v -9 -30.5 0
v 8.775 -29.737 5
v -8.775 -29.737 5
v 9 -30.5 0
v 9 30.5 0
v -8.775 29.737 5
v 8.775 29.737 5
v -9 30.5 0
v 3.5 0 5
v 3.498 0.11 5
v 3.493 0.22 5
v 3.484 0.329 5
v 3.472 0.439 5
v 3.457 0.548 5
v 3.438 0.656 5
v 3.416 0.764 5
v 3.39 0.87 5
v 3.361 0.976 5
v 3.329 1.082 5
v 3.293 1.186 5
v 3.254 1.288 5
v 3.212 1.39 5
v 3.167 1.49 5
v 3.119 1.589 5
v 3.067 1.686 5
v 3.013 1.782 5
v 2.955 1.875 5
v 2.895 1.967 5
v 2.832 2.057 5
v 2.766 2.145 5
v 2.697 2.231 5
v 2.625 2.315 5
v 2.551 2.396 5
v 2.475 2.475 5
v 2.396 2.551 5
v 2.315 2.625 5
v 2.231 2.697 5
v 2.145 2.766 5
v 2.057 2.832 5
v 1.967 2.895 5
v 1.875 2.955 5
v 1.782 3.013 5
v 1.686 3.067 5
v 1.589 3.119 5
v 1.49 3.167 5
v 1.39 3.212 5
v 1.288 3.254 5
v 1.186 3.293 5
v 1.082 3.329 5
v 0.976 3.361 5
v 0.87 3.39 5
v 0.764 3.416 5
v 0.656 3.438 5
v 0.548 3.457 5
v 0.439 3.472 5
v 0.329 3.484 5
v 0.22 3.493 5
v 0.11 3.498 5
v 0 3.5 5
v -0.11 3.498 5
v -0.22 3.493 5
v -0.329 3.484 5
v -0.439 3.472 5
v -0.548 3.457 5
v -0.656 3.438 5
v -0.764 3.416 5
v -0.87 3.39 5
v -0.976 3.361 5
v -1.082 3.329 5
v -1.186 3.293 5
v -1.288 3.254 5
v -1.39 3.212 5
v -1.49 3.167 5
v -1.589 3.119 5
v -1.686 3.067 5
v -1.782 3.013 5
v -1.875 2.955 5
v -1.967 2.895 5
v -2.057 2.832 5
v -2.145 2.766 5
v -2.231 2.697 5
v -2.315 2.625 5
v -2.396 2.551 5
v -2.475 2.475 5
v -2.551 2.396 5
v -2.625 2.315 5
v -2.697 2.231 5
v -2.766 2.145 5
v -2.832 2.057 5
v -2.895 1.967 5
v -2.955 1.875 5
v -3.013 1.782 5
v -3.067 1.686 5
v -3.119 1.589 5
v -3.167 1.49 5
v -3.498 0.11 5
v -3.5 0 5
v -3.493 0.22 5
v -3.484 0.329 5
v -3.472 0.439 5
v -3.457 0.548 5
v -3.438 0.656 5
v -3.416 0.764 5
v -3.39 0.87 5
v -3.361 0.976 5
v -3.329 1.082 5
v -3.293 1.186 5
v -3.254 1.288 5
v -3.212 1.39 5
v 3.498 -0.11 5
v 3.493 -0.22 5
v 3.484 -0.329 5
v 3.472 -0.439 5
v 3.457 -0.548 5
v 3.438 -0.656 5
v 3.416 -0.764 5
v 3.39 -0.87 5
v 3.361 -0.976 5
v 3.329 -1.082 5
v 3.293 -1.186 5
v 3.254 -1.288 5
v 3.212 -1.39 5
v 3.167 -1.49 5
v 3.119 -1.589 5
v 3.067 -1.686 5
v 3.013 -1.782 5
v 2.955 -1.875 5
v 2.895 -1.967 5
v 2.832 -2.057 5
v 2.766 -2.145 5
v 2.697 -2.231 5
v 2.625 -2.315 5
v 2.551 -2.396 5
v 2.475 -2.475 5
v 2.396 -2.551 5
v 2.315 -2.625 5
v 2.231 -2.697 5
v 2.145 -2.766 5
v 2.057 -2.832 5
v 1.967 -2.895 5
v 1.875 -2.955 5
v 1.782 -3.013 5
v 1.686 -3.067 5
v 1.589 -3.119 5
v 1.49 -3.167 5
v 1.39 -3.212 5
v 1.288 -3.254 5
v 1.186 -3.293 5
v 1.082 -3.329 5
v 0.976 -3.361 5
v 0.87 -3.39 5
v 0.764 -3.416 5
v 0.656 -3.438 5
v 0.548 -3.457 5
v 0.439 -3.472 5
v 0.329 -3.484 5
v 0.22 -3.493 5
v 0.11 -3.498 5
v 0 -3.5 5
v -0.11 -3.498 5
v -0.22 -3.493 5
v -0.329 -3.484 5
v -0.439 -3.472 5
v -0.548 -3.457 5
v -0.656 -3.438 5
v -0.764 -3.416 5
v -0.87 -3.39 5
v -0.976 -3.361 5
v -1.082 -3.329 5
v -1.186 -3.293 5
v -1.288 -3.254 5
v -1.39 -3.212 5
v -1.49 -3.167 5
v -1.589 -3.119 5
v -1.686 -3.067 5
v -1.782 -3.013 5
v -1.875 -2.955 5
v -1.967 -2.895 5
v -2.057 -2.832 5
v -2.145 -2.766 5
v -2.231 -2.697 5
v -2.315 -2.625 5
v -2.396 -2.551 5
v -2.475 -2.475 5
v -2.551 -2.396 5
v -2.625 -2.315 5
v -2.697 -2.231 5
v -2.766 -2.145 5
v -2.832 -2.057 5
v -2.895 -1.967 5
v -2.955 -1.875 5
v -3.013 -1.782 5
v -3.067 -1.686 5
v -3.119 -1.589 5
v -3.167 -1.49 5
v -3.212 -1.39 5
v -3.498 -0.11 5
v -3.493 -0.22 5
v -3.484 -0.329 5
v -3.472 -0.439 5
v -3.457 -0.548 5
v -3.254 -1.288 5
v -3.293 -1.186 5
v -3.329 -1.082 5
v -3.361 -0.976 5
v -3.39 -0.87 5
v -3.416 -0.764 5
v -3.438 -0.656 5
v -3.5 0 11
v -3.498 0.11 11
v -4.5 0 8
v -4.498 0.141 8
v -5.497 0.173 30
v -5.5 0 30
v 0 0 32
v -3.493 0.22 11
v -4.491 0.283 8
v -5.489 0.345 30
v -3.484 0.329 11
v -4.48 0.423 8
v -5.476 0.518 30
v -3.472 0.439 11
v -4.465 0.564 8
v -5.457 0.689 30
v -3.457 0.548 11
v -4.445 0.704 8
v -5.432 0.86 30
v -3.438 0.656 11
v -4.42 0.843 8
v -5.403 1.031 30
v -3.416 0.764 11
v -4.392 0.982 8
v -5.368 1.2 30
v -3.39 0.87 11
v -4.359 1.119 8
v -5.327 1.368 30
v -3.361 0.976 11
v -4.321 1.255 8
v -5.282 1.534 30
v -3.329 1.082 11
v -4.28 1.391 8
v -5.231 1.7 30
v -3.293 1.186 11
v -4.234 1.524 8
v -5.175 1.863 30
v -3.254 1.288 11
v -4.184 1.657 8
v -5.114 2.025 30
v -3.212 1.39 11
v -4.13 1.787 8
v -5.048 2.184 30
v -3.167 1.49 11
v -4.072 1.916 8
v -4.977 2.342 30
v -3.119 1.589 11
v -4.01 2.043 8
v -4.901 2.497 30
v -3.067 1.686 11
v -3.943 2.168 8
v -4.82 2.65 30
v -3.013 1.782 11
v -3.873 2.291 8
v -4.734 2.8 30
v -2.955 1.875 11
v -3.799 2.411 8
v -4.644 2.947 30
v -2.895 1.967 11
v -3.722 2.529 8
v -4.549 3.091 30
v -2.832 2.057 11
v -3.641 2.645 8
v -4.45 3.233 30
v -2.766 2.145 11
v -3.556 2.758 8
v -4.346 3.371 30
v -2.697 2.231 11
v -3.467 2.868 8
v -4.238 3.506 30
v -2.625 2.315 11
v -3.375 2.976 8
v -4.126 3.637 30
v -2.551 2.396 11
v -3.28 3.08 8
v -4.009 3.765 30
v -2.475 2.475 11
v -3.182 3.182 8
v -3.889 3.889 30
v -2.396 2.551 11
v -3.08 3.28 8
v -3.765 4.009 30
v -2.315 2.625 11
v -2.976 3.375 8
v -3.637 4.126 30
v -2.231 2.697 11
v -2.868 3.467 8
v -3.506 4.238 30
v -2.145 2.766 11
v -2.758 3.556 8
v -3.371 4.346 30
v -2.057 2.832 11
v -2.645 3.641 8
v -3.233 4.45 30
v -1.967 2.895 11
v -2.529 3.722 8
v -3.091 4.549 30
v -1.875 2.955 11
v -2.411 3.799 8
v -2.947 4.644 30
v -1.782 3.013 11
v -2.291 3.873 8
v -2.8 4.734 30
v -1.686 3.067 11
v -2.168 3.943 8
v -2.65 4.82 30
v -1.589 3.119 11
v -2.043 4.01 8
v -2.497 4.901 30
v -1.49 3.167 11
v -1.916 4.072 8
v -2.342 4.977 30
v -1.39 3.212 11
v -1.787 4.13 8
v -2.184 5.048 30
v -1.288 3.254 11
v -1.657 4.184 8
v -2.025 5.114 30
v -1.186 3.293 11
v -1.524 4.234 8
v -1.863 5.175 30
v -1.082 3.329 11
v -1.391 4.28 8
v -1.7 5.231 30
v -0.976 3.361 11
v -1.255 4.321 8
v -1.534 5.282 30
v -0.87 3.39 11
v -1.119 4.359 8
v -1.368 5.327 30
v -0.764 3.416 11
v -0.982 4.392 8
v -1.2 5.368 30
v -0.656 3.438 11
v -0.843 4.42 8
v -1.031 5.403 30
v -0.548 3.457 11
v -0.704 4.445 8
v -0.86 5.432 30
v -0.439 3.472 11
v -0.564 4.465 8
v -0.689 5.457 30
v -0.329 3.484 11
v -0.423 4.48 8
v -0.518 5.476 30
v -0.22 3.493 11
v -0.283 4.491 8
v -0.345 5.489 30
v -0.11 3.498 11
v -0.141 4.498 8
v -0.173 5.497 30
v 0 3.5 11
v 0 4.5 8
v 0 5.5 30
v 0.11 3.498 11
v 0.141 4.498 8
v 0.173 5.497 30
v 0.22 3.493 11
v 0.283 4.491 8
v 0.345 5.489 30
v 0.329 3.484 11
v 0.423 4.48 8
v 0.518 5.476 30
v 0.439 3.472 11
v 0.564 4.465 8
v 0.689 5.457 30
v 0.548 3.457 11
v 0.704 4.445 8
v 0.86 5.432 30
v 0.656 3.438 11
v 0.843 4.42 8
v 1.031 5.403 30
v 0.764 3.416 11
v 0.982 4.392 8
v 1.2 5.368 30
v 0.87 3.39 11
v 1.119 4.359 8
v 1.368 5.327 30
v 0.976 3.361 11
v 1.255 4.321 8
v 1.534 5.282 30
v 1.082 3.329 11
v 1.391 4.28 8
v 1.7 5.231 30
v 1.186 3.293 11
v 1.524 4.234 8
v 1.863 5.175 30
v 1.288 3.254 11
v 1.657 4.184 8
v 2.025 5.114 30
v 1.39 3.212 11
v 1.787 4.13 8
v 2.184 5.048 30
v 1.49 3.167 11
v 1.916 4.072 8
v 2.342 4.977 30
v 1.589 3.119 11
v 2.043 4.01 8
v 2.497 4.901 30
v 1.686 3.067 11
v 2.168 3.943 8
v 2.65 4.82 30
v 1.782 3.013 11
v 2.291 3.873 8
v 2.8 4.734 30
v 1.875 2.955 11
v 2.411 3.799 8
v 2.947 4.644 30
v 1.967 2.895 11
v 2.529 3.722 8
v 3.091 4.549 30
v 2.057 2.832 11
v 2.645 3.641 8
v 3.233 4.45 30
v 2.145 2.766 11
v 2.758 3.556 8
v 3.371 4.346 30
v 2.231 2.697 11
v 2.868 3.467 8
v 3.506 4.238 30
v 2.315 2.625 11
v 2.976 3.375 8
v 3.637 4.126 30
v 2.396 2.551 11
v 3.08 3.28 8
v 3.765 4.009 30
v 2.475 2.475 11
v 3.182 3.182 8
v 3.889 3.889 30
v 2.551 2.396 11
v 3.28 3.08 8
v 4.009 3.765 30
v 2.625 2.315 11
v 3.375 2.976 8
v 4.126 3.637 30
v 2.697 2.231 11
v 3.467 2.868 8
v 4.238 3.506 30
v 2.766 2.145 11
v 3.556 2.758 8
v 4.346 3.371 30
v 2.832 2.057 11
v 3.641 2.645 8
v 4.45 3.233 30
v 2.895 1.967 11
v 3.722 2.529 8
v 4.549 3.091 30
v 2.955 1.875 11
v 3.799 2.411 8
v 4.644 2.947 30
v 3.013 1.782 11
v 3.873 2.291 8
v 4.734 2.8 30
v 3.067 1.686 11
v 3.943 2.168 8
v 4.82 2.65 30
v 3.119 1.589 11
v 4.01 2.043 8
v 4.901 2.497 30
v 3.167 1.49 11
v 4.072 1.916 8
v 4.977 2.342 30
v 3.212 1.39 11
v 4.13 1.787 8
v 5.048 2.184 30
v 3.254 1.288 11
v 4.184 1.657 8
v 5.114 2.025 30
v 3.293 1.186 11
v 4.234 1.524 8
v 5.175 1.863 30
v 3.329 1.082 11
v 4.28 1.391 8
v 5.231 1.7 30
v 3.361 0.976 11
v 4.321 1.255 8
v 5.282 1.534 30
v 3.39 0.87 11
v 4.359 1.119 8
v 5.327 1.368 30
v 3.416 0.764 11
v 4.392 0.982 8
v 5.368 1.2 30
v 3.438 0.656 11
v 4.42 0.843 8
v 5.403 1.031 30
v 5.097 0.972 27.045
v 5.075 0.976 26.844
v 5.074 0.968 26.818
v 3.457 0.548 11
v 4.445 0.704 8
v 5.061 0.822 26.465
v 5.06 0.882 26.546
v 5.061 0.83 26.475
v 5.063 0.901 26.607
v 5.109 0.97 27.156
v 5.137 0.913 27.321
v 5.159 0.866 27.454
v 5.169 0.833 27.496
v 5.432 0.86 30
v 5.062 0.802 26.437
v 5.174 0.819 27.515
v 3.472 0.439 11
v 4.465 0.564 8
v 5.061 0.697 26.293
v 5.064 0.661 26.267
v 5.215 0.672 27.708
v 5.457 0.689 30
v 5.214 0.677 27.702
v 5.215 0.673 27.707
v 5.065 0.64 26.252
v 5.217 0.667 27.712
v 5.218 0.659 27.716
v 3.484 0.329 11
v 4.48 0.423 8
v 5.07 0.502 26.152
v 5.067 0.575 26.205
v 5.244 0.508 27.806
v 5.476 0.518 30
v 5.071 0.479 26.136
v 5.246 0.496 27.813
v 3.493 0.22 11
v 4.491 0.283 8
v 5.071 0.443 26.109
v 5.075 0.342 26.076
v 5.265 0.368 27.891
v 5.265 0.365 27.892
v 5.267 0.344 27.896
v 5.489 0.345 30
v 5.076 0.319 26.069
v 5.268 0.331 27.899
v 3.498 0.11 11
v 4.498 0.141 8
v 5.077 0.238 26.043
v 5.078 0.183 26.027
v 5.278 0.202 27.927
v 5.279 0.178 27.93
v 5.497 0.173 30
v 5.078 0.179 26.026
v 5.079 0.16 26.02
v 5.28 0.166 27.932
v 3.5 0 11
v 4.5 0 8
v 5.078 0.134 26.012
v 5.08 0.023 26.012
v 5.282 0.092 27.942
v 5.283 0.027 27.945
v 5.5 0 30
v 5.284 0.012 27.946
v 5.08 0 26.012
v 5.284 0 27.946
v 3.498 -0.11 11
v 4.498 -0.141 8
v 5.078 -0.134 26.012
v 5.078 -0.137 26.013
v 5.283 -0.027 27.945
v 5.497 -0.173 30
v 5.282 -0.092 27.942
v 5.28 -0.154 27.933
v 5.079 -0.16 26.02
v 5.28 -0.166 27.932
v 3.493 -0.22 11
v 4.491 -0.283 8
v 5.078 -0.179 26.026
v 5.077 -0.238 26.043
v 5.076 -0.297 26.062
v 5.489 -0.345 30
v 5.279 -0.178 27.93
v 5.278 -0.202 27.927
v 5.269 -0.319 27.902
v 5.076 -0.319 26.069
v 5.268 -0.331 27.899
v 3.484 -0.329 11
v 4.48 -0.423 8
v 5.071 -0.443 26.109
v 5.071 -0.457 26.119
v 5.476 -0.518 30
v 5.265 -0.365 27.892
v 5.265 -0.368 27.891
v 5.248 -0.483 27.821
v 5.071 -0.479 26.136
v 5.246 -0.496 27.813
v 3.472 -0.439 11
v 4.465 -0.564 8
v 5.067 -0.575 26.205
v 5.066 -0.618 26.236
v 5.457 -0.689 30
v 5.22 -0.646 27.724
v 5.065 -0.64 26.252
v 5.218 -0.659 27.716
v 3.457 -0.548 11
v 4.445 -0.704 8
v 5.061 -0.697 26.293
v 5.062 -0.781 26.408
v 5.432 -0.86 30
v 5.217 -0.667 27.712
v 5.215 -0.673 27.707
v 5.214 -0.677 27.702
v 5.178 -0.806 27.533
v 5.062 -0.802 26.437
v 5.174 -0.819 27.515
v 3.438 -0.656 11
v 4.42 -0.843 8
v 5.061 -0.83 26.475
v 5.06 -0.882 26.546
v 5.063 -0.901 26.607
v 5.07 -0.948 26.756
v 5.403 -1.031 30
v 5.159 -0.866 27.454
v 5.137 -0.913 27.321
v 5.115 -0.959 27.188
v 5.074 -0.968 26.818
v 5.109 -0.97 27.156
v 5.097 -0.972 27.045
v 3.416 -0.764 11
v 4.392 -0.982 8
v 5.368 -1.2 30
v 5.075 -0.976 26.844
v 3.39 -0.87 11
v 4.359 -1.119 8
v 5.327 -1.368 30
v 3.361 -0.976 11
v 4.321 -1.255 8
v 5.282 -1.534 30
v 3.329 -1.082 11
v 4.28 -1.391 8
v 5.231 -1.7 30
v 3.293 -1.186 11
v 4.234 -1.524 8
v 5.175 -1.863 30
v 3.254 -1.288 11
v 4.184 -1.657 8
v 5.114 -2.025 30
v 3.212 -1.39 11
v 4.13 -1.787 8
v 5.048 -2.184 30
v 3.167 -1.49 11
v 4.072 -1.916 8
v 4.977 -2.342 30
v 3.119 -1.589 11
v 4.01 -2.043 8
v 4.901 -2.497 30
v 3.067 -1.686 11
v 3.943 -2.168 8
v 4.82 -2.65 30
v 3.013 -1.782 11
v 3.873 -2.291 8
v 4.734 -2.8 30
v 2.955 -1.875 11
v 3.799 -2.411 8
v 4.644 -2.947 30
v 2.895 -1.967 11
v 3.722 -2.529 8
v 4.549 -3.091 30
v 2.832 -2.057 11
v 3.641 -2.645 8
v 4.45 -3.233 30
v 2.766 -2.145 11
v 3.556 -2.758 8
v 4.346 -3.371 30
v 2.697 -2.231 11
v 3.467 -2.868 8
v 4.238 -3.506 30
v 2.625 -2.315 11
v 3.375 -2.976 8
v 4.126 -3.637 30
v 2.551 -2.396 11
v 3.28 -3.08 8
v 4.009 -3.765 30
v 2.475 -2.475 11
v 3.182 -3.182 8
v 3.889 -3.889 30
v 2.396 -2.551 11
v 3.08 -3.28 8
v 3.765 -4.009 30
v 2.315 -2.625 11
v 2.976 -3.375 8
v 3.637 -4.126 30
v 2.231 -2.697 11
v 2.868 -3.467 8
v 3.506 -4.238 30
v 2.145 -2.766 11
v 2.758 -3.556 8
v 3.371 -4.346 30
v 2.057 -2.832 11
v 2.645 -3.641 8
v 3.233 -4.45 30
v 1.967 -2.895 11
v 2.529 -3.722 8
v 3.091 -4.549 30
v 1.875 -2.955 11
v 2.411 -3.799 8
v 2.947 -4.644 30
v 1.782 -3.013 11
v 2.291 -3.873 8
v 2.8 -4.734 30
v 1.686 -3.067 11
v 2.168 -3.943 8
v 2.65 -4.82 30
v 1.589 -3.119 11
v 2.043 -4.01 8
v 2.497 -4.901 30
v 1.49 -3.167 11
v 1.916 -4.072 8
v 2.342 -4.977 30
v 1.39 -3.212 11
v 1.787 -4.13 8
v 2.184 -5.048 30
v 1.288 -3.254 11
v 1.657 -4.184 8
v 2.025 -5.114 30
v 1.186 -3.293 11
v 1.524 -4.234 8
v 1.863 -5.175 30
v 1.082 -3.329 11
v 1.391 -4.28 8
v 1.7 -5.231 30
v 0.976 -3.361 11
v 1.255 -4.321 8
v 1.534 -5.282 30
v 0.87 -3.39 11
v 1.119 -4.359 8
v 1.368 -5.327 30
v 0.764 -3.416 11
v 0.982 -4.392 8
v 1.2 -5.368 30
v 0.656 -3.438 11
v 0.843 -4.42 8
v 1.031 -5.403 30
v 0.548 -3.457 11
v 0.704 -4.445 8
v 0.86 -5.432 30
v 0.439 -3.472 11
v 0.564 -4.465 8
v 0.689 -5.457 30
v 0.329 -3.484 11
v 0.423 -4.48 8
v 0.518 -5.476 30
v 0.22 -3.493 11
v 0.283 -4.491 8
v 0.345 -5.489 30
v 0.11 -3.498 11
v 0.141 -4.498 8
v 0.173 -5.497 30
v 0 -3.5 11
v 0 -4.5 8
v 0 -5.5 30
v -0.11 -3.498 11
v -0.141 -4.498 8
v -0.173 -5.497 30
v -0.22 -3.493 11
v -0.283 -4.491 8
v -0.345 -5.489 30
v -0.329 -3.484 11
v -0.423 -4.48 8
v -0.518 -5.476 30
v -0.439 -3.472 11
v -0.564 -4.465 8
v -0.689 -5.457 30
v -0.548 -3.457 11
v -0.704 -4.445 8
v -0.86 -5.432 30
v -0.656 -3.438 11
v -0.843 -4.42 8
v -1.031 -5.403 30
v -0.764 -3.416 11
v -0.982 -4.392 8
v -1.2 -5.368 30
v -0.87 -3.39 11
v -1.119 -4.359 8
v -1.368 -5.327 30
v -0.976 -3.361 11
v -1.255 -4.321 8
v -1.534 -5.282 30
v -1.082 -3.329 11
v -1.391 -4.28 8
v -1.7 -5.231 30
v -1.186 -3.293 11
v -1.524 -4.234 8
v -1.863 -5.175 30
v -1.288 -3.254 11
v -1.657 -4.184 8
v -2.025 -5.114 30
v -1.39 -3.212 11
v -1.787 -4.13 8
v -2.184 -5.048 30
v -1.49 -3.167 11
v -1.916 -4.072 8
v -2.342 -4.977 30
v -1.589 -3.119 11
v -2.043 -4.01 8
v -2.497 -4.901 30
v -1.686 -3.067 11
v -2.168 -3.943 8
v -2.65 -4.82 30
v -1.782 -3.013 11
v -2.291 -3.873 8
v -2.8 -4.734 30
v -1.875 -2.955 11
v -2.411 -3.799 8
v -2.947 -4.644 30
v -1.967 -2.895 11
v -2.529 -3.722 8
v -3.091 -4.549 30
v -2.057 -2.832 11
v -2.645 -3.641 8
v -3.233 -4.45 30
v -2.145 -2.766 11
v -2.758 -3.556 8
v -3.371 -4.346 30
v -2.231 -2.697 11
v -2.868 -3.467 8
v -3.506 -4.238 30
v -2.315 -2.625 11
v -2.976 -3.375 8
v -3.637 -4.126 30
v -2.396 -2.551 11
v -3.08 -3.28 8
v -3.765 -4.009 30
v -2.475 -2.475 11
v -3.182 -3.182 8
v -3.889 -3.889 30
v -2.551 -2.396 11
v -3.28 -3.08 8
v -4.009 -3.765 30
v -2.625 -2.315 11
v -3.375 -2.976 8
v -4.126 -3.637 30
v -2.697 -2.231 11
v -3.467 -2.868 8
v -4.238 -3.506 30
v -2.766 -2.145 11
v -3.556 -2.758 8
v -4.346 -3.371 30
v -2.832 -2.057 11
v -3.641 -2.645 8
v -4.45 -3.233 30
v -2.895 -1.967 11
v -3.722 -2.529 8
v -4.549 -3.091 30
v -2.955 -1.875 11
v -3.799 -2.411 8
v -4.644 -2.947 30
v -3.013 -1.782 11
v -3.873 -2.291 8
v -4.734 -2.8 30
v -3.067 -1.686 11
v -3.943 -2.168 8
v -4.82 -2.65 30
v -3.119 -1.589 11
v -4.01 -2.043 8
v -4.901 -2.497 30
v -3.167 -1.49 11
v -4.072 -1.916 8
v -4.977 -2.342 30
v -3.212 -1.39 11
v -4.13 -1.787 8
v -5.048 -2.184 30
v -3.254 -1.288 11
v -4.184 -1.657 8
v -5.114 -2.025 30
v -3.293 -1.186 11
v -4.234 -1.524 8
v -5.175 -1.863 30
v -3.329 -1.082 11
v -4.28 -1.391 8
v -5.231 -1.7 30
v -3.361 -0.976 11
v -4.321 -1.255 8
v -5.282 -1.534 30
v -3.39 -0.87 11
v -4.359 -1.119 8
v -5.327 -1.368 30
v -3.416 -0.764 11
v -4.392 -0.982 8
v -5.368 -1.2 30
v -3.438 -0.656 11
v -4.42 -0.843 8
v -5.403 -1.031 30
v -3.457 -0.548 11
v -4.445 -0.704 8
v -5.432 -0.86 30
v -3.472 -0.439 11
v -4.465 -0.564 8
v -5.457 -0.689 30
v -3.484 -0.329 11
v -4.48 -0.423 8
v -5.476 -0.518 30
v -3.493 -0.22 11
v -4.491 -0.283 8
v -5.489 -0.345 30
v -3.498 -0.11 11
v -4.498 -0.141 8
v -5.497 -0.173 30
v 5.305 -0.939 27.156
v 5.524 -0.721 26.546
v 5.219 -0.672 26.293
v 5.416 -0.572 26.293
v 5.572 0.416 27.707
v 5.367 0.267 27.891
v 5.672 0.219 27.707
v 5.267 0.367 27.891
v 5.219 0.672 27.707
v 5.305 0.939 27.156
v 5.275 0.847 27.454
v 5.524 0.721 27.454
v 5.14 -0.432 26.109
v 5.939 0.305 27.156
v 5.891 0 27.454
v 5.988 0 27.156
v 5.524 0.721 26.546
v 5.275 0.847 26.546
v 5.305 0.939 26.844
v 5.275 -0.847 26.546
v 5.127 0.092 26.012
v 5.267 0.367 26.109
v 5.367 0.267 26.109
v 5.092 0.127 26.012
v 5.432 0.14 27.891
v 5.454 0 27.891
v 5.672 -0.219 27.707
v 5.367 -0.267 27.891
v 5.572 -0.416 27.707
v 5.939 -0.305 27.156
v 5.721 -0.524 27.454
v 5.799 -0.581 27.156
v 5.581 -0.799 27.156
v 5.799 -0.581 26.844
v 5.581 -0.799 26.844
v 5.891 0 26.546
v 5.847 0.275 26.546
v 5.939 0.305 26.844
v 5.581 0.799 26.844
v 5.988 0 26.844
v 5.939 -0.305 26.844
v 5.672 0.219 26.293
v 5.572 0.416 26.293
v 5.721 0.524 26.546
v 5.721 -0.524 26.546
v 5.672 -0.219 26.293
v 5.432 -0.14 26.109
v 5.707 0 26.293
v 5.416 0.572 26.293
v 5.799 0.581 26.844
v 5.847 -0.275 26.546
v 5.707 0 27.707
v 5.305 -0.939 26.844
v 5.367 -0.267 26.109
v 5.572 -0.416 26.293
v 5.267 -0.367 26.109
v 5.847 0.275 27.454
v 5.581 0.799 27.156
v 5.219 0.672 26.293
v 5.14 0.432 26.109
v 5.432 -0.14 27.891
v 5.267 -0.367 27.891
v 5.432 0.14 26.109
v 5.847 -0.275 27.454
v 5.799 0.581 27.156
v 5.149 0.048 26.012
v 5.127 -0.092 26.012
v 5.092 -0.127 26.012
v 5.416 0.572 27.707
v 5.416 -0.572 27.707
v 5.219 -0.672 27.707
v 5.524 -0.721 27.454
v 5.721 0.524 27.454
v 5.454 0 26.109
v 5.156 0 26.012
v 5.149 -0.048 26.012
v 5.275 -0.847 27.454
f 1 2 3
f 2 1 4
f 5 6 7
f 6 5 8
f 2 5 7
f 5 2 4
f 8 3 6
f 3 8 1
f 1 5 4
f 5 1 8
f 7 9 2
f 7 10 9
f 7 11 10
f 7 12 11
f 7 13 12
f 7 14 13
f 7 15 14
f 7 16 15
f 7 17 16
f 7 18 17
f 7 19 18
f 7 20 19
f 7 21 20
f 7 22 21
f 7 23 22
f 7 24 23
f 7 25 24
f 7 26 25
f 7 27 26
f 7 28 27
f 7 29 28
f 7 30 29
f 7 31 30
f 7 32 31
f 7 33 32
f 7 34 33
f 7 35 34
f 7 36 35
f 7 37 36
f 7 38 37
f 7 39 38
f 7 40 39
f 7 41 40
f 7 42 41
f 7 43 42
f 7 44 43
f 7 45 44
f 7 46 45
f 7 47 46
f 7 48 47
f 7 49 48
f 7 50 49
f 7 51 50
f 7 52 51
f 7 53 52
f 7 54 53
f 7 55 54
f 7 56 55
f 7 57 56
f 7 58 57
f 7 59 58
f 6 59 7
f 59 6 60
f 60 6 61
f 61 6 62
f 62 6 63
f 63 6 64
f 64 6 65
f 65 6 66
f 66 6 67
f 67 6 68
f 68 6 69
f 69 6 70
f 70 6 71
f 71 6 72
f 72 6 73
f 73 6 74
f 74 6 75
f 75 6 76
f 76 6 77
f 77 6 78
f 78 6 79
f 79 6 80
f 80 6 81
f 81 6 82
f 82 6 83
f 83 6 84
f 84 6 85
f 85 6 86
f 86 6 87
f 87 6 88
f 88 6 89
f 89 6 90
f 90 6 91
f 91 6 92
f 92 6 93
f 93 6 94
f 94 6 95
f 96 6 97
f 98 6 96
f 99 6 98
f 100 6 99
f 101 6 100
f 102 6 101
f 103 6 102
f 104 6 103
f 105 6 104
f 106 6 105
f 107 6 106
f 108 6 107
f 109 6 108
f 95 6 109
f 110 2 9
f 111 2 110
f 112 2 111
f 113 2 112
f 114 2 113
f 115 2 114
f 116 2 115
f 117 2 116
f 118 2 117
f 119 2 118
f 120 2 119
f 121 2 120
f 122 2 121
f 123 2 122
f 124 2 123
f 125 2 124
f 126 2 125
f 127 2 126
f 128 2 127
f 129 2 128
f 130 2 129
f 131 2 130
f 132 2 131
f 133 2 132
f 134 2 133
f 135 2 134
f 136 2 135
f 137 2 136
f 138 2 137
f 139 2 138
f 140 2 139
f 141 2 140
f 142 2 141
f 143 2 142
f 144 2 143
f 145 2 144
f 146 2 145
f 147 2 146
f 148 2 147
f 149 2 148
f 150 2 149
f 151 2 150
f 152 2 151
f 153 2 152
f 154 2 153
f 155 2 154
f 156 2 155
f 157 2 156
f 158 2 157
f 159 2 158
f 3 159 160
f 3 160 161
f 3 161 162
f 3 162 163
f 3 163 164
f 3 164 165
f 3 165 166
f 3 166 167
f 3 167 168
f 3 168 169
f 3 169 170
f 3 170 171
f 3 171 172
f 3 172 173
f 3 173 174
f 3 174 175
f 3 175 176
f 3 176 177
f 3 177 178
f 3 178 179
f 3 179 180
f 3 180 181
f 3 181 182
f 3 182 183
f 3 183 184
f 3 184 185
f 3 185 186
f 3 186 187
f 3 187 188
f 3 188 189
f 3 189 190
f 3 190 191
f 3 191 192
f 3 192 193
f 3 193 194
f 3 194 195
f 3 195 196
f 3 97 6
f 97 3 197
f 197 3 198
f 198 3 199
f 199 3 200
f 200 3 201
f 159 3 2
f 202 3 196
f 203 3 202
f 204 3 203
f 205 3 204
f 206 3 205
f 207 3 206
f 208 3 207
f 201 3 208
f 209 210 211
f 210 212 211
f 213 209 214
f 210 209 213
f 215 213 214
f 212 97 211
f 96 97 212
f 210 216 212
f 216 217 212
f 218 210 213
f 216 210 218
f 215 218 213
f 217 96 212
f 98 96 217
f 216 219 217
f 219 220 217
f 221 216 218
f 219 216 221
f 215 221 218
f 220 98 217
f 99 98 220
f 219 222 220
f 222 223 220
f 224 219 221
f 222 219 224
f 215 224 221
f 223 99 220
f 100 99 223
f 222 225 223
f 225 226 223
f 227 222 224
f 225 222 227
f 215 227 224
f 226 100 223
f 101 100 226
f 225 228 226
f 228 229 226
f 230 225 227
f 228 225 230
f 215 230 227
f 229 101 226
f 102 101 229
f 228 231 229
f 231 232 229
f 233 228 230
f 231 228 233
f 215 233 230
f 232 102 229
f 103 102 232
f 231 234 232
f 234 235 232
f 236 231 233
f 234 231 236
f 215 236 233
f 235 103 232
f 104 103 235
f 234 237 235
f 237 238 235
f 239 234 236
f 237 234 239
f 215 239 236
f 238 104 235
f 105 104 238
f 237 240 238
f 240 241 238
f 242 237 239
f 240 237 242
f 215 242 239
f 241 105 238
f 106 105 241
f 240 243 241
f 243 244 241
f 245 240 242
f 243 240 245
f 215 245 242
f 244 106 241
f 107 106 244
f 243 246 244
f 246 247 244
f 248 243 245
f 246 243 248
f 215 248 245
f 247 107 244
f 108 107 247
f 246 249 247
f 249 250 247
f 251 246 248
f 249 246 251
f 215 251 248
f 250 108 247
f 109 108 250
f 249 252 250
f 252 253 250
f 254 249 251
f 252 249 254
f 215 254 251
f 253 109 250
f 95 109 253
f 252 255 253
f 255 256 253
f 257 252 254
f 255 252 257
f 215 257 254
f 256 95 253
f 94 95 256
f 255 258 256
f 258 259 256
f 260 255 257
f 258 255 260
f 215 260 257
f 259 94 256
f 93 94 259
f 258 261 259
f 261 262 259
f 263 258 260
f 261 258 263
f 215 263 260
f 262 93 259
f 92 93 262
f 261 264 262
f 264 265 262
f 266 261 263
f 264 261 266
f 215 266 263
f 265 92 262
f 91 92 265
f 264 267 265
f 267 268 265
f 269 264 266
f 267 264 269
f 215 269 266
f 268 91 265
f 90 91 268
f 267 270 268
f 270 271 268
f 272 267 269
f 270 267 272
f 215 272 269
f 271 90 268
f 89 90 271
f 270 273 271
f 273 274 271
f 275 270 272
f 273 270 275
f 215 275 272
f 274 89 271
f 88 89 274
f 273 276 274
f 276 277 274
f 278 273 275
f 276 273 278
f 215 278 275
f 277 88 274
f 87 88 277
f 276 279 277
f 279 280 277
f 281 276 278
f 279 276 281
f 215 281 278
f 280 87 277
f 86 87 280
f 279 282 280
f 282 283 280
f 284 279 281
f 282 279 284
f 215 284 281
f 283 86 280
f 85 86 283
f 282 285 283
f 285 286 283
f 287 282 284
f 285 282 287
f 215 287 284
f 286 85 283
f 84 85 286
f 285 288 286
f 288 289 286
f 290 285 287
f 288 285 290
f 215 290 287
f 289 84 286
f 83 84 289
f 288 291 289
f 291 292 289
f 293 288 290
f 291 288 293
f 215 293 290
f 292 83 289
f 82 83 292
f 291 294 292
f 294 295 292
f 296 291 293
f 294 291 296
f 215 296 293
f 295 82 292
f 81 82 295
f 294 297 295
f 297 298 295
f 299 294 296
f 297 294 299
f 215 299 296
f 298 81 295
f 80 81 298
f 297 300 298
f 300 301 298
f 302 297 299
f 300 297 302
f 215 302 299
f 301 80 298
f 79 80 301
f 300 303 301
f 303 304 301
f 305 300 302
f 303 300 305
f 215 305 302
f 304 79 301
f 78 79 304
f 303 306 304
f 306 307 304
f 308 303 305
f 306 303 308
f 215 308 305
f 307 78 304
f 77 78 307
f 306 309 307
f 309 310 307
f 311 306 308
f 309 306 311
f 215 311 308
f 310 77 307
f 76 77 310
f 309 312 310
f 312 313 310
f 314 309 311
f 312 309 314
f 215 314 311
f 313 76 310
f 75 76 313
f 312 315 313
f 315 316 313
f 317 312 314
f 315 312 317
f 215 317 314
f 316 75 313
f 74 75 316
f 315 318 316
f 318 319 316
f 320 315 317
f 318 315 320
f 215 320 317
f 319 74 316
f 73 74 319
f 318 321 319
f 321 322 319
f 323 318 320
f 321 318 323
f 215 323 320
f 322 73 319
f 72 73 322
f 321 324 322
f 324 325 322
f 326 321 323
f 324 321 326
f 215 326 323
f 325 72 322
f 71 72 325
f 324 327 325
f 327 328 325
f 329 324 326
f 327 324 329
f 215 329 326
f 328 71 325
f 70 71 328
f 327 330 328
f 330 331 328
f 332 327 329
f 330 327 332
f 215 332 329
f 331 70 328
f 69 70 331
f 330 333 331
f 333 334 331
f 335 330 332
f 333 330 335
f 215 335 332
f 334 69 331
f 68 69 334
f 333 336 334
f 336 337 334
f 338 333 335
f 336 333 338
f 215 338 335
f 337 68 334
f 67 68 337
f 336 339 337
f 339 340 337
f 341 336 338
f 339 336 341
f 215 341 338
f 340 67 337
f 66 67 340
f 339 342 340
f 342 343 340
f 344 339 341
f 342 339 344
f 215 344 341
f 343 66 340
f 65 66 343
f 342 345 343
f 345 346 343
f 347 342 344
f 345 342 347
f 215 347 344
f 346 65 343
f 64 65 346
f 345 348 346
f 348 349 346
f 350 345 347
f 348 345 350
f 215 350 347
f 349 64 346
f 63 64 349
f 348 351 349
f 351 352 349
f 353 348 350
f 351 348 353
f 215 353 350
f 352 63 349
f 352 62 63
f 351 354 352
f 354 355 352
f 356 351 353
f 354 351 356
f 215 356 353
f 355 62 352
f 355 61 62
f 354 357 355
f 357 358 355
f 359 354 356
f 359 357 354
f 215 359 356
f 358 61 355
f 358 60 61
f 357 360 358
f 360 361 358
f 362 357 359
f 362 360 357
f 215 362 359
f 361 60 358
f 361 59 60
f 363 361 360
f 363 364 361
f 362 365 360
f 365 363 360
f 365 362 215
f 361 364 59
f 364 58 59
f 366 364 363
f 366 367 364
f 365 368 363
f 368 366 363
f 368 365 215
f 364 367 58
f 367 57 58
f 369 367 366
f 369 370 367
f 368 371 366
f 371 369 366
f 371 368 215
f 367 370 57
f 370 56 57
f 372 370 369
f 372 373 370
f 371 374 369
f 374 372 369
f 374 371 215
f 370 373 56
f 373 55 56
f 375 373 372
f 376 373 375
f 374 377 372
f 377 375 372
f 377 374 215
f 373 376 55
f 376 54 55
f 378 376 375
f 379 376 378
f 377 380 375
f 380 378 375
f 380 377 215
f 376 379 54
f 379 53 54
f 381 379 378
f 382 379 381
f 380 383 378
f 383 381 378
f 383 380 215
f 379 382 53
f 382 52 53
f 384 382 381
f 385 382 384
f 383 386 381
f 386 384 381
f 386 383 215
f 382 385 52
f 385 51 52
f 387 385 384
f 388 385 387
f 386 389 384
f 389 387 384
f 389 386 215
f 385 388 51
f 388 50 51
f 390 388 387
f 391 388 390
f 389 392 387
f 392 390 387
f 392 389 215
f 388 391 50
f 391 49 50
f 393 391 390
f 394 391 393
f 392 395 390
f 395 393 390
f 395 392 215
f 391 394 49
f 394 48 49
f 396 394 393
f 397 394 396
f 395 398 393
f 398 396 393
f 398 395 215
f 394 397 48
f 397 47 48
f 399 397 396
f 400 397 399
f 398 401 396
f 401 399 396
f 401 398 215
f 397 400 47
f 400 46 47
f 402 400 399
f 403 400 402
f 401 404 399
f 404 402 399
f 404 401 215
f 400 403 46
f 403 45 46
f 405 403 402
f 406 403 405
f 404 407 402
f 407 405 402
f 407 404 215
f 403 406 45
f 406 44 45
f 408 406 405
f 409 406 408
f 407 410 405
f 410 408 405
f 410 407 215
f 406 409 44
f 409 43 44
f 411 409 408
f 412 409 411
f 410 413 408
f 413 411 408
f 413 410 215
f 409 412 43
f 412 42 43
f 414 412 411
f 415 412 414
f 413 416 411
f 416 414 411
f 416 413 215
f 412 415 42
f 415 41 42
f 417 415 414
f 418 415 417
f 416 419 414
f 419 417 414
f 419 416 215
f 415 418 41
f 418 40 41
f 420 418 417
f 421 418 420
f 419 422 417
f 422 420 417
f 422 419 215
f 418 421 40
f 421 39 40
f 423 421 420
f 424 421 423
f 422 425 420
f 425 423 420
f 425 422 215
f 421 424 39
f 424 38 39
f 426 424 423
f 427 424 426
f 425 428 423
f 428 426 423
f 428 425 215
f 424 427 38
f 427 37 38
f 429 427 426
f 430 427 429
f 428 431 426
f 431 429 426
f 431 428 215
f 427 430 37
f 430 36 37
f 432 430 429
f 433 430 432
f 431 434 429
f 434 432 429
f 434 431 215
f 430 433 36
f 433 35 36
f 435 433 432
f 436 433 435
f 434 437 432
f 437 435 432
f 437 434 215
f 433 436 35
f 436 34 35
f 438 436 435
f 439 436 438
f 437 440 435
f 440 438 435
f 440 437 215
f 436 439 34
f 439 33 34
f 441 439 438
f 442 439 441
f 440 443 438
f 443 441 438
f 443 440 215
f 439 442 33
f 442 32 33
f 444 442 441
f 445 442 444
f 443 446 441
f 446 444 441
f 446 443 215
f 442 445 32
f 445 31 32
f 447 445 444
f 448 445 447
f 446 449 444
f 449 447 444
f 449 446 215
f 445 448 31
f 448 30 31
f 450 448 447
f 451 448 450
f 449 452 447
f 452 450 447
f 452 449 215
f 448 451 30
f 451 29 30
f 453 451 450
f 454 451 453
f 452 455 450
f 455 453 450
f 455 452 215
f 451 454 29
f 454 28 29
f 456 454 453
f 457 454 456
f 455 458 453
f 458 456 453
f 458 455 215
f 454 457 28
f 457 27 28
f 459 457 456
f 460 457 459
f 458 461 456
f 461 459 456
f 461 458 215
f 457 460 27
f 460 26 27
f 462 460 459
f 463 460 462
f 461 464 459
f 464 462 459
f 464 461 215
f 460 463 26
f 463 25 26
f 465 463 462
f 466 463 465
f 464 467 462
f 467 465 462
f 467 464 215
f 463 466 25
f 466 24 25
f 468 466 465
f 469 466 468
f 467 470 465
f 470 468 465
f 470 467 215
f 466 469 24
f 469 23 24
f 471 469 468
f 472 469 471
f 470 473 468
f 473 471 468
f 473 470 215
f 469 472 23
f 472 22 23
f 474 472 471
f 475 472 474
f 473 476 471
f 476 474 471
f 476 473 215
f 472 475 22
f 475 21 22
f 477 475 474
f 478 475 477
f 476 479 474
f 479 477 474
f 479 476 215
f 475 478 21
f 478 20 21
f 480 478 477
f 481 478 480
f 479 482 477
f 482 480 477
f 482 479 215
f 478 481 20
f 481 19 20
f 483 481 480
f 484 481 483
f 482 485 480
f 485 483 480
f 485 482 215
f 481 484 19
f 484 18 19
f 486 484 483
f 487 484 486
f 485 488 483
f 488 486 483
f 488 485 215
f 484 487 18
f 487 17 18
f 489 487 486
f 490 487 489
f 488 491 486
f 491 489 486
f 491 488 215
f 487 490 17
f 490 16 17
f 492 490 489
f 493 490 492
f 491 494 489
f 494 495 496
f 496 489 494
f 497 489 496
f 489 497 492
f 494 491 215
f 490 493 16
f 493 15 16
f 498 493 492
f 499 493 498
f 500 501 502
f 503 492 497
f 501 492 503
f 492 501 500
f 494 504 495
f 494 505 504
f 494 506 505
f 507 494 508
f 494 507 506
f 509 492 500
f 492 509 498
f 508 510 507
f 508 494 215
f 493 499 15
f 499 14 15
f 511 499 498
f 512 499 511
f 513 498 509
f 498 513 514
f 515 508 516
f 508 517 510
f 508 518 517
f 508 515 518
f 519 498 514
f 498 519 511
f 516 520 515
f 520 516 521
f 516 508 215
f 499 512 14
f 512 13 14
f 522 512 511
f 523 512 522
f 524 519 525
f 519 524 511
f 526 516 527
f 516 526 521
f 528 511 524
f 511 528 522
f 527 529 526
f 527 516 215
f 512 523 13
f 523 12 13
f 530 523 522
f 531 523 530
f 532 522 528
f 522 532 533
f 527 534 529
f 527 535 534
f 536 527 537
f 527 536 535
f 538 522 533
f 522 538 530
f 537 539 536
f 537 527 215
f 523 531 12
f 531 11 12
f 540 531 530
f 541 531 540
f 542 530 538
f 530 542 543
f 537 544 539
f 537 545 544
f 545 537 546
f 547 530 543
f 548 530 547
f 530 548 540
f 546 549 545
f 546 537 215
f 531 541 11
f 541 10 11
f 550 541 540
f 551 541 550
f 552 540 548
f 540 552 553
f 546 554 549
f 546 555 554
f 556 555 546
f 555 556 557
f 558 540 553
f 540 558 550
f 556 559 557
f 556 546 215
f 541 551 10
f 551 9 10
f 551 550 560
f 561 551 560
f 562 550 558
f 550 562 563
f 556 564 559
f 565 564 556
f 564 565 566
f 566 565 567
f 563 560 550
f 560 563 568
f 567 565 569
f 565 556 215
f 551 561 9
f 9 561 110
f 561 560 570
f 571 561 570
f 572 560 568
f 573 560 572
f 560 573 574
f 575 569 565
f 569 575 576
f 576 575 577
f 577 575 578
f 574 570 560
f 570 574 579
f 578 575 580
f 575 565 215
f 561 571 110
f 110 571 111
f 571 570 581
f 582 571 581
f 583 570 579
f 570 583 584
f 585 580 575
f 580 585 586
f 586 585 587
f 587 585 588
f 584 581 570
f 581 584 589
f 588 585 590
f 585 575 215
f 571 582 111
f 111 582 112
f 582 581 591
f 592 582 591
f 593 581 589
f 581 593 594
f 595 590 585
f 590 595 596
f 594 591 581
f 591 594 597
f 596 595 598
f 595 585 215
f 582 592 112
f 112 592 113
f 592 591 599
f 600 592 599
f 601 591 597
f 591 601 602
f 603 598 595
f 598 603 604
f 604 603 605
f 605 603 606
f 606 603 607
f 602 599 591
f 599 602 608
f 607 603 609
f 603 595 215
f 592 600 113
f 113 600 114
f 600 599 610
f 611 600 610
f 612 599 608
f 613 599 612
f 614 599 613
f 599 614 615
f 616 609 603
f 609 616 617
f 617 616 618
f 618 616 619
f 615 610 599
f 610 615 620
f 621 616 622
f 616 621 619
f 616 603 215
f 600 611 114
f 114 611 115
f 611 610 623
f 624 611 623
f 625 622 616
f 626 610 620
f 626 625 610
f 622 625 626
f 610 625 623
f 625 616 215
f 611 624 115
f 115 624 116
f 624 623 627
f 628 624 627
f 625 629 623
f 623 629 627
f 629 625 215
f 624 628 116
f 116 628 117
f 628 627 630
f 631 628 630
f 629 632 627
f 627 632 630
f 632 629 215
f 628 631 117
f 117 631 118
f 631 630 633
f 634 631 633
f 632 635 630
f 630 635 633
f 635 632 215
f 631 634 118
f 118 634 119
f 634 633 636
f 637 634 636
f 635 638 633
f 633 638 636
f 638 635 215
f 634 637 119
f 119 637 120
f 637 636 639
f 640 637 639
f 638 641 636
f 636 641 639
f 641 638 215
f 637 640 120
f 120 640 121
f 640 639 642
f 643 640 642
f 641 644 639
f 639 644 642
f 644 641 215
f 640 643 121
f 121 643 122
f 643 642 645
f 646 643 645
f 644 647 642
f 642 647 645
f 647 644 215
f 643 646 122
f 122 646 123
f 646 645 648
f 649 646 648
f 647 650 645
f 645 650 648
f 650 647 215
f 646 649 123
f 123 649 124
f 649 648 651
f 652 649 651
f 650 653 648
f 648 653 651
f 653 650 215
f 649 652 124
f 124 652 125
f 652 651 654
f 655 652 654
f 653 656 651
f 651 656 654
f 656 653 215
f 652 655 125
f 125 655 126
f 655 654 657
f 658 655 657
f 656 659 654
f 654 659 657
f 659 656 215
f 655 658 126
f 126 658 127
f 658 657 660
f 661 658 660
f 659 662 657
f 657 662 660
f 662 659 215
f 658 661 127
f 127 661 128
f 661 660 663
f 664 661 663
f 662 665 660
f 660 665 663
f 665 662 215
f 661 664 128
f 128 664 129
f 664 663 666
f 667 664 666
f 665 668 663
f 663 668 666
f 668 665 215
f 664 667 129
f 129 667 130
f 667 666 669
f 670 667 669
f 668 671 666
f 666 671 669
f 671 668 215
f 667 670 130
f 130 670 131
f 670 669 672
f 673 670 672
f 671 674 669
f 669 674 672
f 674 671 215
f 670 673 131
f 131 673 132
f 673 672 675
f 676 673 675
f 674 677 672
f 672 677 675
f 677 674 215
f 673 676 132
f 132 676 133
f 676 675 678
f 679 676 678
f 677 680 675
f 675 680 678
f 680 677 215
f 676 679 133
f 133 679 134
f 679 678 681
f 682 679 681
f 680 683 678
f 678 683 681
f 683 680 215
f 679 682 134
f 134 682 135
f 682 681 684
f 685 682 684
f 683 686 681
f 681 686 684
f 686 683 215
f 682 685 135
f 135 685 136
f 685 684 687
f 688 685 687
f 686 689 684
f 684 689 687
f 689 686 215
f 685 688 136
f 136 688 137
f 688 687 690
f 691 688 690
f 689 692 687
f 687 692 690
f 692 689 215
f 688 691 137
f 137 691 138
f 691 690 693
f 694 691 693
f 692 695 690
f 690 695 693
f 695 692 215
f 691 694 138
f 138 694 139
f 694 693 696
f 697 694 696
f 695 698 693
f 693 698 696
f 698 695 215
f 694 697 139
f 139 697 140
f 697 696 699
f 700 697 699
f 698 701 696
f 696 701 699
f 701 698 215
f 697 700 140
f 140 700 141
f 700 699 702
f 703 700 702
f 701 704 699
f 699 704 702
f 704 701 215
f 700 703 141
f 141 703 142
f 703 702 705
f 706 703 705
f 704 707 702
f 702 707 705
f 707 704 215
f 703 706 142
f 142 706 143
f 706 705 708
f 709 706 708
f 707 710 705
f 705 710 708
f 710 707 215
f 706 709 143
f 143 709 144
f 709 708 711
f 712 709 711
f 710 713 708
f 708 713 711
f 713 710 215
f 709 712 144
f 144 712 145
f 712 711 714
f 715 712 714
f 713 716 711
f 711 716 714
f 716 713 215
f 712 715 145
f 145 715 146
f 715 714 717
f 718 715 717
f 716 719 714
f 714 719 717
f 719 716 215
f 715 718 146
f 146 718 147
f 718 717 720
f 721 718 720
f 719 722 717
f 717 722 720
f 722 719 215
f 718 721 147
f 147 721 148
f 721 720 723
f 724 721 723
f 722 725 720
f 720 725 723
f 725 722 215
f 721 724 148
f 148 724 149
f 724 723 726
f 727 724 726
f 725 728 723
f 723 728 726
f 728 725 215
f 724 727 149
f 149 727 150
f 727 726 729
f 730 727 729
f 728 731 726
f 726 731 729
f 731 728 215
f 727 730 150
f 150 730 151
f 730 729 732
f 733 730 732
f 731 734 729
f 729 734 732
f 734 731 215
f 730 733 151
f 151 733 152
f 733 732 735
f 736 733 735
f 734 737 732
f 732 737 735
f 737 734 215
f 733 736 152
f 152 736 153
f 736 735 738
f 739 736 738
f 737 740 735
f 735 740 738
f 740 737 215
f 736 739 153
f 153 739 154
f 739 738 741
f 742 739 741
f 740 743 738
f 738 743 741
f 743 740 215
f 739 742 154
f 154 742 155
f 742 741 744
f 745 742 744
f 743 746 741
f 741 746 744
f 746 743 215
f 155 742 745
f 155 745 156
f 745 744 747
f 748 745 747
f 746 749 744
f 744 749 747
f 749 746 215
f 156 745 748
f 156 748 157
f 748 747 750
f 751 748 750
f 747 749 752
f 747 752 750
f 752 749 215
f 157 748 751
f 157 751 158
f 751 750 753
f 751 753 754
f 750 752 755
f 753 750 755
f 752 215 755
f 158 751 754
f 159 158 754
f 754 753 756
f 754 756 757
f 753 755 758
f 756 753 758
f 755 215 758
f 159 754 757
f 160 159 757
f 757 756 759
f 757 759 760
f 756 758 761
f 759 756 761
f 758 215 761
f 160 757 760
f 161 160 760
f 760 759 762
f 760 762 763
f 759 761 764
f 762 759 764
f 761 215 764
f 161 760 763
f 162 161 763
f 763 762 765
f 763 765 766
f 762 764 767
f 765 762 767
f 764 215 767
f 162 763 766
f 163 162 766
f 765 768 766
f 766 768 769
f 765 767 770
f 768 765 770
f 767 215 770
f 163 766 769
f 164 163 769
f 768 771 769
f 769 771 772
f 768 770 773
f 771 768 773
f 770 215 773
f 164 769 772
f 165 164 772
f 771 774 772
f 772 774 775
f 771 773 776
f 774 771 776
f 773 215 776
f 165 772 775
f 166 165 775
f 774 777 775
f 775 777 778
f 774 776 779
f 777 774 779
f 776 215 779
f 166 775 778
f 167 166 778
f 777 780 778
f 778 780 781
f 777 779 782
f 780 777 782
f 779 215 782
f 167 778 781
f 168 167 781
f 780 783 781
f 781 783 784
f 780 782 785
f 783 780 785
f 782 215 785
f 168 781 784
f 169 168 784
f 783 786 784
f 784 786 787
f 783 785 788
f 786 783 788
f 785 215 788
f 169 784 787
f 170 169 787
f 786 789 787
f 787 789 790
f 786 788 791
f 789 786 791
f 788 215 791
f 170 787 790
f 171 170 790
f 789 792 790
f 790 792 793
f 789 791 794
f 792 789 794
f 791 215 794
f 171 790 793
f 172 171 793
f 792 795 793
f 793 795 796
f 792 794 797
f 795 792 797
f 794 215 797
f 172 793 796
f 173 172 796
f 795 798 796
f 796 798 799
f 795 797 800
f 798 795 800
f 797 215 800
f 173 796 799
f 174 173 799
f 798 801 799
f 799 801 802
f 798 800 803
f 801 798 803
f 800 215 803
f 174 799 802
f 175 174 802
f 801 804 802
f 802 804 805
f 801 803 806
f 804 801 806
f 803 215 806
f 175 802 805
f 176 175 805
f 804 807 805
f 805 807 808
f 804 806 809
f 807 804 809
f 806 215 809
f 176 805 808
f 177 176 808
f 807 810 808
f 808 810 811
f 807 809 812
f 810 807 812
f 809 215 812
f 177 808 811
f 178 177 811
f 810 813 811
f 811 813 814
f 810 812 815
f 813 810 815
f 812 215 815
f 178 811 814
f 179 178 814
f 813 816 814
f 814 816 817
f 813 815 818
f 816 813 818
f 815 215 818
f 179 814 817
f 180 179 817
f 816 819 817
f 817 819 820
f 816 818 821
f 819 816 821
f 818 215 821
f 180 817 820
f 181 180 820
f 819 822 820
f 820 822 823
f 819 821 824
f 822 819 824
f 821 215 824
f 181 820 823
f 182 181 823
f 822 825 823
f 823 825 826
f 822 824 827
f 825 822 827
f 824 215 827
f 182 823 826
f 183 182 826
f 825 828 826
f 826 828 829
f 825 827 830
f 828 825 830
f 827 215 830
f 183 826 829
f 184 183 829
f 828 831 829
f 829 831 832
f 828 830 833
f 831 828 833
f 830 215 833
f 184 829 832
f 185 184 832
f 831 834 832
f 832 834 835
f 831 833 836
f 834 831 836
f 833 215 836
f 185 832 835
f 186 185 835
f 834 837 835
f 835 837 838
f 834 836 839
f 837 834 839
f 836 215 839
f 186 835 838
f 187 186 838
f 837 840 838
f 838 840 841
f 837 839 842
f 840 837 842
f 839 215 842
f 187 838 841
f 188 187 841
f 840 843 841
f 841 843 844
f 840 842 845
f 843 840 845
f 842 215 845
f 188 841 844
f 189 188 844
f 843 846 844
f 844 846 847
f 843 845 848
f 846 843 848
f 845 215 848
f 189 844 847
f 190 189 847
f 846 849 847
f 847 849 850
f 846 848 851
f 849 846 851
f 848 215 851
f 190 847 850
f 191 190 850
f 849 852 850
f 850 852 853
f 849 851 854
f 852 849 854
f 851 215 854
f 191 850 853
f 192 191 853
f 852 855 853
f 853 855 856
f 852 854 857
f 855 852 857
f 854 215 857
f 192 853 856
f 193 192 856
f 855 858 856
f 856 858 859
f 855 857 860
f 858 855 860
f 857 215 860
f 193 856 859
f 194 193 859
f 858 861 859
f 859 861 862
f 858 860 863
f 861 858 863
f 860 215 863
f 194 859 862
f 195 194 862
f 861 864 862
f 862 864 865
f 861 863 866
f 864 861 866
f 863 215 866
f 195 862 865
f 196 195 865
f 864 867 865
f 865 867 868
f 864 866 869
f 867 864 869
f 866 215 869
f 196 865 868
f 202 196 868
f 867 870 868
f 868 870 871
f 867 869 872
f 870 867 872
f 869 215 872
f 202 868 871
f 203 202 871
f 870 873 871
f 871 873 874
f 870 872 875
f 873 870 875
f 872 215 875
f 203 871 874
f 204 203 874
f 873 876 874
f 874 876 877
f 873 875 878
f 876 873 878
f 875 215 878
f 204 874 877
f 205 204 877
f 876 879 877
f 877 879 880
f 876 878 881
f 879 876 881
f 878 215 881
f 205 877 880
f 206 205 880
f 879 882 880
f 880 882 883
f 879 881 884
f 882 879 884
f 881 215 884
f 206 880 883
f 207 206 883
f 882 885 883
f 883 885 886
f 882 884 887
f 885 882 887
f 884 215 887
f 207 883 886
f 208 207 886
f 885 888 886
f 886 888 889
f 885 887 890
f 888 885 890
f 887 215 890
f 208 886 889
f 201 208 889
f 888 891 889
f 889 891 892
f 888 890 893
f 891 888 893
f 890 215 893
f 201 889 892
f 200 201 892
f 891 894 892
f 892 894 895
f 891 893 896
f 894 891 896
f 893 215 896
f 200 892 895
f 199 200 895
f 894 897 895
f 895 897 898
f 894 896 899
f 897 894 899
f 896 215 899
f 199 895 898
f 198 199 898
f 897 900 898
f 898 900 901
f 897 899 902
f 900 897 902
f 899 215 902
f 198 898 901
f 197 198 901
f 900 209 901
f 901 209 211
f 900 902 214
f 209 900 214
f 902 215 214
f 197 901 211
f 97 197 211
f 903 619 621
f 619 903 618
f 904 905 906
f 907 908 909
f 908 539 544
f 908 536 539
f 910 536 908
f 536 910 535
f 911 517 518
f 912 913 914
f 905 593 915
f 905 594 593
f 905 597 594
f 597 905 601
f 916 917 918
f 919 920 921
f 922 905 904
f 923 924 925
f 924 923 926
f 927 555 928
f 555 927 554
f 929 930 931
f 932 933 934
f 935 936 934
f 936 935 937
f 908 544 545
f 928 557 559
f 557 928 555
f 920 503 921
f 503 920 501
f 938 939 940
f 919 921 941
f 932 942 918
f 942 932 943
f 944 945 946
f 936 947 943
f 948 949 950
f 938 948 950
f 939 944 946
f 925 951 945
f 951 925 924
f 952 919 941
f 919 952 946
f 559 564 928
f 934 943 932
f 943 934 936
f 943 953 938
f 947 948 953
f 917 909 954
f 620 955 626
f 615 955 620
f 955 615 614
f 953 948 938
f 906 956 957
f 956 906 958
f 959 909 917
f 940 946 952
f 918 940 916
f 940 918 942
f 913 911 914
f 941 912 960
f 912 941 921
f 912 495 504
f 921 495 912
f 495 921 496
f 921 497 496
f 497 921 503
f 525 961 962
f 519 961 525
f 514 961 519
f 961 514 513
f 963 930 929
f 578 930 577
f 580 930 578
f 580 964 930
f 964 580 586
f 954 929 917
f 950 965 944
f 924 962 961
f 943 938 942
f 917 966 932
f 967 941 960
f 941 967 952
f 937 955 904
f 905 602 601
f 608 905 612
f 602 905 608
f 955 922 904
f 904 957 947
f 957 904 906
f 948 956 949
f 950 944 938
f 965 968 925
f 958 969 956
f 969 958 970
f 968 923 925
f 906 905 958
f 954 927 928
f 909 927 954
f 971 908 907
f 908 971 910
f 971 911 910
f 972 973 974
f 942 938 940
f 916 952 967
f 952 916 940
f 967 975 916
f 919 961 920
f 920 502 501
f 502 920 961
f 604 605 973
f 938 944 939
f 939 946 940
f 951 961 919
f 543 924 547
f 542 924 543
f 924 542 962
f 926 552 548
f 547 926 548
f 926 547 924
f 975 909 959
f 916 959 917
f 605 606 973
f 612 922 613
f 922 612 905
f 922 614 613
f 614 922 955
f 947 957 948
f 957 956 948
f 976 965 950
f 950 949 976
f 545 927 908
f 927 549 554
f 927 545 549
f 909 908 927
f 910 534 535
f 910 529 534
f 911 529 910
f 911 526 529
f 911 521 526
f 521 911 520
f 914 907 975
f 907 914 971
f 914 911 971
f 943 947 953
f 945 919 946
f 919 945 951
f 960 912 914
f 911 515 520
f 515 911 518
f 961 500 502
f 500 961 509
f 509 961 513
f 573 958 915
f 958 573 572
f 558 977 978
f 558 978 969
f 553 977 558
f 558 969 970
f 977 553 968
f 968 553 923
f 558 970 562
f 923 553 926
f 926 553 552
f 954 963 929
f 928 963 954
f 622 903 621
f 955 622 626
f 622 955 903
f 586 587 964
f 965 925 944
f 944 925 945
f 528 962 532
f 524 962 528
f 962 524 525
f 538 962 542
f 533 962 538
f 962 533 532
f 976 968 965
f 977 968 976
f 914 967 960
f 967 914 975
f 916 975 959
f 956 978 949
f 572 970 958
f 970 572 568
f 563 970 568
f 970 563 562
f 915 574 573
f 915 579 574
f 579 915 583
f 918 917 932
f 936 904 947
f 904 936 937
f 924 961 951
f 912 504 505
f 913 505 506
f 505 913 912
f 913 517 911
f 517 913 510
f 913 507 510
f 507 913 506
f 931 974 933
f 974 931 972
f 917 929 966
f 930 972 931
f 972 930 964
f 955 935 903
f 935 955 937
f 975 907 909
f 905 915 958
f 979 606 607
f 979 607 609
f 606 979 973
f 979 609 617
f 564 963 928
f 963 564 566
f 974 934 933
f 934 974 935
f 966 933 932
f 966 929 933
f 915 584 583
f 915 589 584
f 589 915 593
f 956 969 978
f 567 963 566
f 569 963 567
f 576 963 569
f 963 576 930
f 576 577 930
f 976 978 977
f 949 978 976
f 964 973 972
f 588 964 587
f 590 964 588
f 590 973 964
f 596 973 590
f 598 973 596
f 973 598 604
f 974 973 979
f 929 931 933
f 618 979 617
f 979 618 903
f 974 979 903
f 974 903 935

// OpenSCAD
WIDTH 	= 18; // [0:200]
LENGTH 	= 61; // [0:200]


translate([-WIDTH/2,-LENGTH/2,0]) {
	difference() {
		pyramid(WIDTH,LENGTH,200);
	   translate([0,0,5]) cube([WIDTH,LENGTH,200]);
	}
	
	translate([WIDTH/2,LENGTH/2,5]) {
		rotate_extrude($fn=200) polygon(points=[[0,0],[3.5,0],[4.5,3],[3.5,6],[5.5,25],[0,27]]);
		translate([5,0,22]) sphere(r=1, $fn=20);
	}
}



// By Danny Staple, https://github.com/dannystaple/OpenSCAD-Parts-Library
module pyramid(w, l, h) {
	mw = w/2;
	ml = l/2;
	polyhedron(points = [
		[0, 0, 0],
		[w, 0, 0],
		[0, l, 0],
		[w, l, 0],
		[mw, ml, h]
	], triangles = [
		[4, 1, 0],
		[4, 3, 1],
		[4, 2, 3],
		[4, 0, 2],
	//base
		[0, 1, 2],
		[2, 1, 3]
	]);
}
